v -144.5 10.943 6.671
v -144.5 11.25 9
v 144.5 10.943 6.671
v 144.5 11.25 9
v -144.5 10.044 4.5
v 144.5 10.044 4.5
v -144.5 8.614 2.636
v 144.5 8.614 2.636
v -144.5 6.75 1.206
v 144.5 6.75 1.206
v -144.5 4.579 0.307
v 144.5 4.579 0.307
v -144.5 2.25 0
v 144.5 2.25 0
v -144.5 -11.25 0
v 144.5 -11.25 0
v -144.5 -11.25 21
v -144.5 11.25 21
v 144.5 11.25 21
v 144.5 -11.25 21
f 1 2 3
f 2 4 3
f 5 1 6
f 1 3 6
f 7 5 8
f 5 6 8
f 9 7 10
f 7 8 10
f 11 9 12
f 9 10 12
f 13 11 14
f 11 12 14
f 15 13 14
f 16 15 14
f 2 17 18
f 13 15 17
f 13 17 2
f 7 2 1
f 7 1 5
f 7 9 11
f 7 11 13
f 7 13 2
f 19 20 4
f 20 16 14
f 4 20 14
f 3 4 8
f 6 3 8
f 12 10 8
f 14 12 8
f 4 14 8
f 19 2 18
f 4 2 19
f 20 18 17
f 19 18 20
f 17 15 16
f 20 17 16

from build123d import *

# Parameters (mm, degrees)
SKETCH_1_W      = 289
SKETCH_1_H      = 22.5
EXTRUDE_1_DEPTH = 21
FILLET_1_R      = 9


with BuildPart() as part:
    # 草图1 → 凸台-拉伸1 (new body)
    with BuildSketch(Plane.XY):
        Rectangle(SKETCH_1_W, SKETCH_1_H)
    extrude(amount=EXTRUDE_1_DEPTH)

    # 圆角1
    fillet_1_edges = [part.edges().sort_by_distance(p)[0] for p in [
        (0, 11.25, 0),
    ]]
    fillet(fillet_1_edges, radius=FILLET_1_R)


solid = part.part
